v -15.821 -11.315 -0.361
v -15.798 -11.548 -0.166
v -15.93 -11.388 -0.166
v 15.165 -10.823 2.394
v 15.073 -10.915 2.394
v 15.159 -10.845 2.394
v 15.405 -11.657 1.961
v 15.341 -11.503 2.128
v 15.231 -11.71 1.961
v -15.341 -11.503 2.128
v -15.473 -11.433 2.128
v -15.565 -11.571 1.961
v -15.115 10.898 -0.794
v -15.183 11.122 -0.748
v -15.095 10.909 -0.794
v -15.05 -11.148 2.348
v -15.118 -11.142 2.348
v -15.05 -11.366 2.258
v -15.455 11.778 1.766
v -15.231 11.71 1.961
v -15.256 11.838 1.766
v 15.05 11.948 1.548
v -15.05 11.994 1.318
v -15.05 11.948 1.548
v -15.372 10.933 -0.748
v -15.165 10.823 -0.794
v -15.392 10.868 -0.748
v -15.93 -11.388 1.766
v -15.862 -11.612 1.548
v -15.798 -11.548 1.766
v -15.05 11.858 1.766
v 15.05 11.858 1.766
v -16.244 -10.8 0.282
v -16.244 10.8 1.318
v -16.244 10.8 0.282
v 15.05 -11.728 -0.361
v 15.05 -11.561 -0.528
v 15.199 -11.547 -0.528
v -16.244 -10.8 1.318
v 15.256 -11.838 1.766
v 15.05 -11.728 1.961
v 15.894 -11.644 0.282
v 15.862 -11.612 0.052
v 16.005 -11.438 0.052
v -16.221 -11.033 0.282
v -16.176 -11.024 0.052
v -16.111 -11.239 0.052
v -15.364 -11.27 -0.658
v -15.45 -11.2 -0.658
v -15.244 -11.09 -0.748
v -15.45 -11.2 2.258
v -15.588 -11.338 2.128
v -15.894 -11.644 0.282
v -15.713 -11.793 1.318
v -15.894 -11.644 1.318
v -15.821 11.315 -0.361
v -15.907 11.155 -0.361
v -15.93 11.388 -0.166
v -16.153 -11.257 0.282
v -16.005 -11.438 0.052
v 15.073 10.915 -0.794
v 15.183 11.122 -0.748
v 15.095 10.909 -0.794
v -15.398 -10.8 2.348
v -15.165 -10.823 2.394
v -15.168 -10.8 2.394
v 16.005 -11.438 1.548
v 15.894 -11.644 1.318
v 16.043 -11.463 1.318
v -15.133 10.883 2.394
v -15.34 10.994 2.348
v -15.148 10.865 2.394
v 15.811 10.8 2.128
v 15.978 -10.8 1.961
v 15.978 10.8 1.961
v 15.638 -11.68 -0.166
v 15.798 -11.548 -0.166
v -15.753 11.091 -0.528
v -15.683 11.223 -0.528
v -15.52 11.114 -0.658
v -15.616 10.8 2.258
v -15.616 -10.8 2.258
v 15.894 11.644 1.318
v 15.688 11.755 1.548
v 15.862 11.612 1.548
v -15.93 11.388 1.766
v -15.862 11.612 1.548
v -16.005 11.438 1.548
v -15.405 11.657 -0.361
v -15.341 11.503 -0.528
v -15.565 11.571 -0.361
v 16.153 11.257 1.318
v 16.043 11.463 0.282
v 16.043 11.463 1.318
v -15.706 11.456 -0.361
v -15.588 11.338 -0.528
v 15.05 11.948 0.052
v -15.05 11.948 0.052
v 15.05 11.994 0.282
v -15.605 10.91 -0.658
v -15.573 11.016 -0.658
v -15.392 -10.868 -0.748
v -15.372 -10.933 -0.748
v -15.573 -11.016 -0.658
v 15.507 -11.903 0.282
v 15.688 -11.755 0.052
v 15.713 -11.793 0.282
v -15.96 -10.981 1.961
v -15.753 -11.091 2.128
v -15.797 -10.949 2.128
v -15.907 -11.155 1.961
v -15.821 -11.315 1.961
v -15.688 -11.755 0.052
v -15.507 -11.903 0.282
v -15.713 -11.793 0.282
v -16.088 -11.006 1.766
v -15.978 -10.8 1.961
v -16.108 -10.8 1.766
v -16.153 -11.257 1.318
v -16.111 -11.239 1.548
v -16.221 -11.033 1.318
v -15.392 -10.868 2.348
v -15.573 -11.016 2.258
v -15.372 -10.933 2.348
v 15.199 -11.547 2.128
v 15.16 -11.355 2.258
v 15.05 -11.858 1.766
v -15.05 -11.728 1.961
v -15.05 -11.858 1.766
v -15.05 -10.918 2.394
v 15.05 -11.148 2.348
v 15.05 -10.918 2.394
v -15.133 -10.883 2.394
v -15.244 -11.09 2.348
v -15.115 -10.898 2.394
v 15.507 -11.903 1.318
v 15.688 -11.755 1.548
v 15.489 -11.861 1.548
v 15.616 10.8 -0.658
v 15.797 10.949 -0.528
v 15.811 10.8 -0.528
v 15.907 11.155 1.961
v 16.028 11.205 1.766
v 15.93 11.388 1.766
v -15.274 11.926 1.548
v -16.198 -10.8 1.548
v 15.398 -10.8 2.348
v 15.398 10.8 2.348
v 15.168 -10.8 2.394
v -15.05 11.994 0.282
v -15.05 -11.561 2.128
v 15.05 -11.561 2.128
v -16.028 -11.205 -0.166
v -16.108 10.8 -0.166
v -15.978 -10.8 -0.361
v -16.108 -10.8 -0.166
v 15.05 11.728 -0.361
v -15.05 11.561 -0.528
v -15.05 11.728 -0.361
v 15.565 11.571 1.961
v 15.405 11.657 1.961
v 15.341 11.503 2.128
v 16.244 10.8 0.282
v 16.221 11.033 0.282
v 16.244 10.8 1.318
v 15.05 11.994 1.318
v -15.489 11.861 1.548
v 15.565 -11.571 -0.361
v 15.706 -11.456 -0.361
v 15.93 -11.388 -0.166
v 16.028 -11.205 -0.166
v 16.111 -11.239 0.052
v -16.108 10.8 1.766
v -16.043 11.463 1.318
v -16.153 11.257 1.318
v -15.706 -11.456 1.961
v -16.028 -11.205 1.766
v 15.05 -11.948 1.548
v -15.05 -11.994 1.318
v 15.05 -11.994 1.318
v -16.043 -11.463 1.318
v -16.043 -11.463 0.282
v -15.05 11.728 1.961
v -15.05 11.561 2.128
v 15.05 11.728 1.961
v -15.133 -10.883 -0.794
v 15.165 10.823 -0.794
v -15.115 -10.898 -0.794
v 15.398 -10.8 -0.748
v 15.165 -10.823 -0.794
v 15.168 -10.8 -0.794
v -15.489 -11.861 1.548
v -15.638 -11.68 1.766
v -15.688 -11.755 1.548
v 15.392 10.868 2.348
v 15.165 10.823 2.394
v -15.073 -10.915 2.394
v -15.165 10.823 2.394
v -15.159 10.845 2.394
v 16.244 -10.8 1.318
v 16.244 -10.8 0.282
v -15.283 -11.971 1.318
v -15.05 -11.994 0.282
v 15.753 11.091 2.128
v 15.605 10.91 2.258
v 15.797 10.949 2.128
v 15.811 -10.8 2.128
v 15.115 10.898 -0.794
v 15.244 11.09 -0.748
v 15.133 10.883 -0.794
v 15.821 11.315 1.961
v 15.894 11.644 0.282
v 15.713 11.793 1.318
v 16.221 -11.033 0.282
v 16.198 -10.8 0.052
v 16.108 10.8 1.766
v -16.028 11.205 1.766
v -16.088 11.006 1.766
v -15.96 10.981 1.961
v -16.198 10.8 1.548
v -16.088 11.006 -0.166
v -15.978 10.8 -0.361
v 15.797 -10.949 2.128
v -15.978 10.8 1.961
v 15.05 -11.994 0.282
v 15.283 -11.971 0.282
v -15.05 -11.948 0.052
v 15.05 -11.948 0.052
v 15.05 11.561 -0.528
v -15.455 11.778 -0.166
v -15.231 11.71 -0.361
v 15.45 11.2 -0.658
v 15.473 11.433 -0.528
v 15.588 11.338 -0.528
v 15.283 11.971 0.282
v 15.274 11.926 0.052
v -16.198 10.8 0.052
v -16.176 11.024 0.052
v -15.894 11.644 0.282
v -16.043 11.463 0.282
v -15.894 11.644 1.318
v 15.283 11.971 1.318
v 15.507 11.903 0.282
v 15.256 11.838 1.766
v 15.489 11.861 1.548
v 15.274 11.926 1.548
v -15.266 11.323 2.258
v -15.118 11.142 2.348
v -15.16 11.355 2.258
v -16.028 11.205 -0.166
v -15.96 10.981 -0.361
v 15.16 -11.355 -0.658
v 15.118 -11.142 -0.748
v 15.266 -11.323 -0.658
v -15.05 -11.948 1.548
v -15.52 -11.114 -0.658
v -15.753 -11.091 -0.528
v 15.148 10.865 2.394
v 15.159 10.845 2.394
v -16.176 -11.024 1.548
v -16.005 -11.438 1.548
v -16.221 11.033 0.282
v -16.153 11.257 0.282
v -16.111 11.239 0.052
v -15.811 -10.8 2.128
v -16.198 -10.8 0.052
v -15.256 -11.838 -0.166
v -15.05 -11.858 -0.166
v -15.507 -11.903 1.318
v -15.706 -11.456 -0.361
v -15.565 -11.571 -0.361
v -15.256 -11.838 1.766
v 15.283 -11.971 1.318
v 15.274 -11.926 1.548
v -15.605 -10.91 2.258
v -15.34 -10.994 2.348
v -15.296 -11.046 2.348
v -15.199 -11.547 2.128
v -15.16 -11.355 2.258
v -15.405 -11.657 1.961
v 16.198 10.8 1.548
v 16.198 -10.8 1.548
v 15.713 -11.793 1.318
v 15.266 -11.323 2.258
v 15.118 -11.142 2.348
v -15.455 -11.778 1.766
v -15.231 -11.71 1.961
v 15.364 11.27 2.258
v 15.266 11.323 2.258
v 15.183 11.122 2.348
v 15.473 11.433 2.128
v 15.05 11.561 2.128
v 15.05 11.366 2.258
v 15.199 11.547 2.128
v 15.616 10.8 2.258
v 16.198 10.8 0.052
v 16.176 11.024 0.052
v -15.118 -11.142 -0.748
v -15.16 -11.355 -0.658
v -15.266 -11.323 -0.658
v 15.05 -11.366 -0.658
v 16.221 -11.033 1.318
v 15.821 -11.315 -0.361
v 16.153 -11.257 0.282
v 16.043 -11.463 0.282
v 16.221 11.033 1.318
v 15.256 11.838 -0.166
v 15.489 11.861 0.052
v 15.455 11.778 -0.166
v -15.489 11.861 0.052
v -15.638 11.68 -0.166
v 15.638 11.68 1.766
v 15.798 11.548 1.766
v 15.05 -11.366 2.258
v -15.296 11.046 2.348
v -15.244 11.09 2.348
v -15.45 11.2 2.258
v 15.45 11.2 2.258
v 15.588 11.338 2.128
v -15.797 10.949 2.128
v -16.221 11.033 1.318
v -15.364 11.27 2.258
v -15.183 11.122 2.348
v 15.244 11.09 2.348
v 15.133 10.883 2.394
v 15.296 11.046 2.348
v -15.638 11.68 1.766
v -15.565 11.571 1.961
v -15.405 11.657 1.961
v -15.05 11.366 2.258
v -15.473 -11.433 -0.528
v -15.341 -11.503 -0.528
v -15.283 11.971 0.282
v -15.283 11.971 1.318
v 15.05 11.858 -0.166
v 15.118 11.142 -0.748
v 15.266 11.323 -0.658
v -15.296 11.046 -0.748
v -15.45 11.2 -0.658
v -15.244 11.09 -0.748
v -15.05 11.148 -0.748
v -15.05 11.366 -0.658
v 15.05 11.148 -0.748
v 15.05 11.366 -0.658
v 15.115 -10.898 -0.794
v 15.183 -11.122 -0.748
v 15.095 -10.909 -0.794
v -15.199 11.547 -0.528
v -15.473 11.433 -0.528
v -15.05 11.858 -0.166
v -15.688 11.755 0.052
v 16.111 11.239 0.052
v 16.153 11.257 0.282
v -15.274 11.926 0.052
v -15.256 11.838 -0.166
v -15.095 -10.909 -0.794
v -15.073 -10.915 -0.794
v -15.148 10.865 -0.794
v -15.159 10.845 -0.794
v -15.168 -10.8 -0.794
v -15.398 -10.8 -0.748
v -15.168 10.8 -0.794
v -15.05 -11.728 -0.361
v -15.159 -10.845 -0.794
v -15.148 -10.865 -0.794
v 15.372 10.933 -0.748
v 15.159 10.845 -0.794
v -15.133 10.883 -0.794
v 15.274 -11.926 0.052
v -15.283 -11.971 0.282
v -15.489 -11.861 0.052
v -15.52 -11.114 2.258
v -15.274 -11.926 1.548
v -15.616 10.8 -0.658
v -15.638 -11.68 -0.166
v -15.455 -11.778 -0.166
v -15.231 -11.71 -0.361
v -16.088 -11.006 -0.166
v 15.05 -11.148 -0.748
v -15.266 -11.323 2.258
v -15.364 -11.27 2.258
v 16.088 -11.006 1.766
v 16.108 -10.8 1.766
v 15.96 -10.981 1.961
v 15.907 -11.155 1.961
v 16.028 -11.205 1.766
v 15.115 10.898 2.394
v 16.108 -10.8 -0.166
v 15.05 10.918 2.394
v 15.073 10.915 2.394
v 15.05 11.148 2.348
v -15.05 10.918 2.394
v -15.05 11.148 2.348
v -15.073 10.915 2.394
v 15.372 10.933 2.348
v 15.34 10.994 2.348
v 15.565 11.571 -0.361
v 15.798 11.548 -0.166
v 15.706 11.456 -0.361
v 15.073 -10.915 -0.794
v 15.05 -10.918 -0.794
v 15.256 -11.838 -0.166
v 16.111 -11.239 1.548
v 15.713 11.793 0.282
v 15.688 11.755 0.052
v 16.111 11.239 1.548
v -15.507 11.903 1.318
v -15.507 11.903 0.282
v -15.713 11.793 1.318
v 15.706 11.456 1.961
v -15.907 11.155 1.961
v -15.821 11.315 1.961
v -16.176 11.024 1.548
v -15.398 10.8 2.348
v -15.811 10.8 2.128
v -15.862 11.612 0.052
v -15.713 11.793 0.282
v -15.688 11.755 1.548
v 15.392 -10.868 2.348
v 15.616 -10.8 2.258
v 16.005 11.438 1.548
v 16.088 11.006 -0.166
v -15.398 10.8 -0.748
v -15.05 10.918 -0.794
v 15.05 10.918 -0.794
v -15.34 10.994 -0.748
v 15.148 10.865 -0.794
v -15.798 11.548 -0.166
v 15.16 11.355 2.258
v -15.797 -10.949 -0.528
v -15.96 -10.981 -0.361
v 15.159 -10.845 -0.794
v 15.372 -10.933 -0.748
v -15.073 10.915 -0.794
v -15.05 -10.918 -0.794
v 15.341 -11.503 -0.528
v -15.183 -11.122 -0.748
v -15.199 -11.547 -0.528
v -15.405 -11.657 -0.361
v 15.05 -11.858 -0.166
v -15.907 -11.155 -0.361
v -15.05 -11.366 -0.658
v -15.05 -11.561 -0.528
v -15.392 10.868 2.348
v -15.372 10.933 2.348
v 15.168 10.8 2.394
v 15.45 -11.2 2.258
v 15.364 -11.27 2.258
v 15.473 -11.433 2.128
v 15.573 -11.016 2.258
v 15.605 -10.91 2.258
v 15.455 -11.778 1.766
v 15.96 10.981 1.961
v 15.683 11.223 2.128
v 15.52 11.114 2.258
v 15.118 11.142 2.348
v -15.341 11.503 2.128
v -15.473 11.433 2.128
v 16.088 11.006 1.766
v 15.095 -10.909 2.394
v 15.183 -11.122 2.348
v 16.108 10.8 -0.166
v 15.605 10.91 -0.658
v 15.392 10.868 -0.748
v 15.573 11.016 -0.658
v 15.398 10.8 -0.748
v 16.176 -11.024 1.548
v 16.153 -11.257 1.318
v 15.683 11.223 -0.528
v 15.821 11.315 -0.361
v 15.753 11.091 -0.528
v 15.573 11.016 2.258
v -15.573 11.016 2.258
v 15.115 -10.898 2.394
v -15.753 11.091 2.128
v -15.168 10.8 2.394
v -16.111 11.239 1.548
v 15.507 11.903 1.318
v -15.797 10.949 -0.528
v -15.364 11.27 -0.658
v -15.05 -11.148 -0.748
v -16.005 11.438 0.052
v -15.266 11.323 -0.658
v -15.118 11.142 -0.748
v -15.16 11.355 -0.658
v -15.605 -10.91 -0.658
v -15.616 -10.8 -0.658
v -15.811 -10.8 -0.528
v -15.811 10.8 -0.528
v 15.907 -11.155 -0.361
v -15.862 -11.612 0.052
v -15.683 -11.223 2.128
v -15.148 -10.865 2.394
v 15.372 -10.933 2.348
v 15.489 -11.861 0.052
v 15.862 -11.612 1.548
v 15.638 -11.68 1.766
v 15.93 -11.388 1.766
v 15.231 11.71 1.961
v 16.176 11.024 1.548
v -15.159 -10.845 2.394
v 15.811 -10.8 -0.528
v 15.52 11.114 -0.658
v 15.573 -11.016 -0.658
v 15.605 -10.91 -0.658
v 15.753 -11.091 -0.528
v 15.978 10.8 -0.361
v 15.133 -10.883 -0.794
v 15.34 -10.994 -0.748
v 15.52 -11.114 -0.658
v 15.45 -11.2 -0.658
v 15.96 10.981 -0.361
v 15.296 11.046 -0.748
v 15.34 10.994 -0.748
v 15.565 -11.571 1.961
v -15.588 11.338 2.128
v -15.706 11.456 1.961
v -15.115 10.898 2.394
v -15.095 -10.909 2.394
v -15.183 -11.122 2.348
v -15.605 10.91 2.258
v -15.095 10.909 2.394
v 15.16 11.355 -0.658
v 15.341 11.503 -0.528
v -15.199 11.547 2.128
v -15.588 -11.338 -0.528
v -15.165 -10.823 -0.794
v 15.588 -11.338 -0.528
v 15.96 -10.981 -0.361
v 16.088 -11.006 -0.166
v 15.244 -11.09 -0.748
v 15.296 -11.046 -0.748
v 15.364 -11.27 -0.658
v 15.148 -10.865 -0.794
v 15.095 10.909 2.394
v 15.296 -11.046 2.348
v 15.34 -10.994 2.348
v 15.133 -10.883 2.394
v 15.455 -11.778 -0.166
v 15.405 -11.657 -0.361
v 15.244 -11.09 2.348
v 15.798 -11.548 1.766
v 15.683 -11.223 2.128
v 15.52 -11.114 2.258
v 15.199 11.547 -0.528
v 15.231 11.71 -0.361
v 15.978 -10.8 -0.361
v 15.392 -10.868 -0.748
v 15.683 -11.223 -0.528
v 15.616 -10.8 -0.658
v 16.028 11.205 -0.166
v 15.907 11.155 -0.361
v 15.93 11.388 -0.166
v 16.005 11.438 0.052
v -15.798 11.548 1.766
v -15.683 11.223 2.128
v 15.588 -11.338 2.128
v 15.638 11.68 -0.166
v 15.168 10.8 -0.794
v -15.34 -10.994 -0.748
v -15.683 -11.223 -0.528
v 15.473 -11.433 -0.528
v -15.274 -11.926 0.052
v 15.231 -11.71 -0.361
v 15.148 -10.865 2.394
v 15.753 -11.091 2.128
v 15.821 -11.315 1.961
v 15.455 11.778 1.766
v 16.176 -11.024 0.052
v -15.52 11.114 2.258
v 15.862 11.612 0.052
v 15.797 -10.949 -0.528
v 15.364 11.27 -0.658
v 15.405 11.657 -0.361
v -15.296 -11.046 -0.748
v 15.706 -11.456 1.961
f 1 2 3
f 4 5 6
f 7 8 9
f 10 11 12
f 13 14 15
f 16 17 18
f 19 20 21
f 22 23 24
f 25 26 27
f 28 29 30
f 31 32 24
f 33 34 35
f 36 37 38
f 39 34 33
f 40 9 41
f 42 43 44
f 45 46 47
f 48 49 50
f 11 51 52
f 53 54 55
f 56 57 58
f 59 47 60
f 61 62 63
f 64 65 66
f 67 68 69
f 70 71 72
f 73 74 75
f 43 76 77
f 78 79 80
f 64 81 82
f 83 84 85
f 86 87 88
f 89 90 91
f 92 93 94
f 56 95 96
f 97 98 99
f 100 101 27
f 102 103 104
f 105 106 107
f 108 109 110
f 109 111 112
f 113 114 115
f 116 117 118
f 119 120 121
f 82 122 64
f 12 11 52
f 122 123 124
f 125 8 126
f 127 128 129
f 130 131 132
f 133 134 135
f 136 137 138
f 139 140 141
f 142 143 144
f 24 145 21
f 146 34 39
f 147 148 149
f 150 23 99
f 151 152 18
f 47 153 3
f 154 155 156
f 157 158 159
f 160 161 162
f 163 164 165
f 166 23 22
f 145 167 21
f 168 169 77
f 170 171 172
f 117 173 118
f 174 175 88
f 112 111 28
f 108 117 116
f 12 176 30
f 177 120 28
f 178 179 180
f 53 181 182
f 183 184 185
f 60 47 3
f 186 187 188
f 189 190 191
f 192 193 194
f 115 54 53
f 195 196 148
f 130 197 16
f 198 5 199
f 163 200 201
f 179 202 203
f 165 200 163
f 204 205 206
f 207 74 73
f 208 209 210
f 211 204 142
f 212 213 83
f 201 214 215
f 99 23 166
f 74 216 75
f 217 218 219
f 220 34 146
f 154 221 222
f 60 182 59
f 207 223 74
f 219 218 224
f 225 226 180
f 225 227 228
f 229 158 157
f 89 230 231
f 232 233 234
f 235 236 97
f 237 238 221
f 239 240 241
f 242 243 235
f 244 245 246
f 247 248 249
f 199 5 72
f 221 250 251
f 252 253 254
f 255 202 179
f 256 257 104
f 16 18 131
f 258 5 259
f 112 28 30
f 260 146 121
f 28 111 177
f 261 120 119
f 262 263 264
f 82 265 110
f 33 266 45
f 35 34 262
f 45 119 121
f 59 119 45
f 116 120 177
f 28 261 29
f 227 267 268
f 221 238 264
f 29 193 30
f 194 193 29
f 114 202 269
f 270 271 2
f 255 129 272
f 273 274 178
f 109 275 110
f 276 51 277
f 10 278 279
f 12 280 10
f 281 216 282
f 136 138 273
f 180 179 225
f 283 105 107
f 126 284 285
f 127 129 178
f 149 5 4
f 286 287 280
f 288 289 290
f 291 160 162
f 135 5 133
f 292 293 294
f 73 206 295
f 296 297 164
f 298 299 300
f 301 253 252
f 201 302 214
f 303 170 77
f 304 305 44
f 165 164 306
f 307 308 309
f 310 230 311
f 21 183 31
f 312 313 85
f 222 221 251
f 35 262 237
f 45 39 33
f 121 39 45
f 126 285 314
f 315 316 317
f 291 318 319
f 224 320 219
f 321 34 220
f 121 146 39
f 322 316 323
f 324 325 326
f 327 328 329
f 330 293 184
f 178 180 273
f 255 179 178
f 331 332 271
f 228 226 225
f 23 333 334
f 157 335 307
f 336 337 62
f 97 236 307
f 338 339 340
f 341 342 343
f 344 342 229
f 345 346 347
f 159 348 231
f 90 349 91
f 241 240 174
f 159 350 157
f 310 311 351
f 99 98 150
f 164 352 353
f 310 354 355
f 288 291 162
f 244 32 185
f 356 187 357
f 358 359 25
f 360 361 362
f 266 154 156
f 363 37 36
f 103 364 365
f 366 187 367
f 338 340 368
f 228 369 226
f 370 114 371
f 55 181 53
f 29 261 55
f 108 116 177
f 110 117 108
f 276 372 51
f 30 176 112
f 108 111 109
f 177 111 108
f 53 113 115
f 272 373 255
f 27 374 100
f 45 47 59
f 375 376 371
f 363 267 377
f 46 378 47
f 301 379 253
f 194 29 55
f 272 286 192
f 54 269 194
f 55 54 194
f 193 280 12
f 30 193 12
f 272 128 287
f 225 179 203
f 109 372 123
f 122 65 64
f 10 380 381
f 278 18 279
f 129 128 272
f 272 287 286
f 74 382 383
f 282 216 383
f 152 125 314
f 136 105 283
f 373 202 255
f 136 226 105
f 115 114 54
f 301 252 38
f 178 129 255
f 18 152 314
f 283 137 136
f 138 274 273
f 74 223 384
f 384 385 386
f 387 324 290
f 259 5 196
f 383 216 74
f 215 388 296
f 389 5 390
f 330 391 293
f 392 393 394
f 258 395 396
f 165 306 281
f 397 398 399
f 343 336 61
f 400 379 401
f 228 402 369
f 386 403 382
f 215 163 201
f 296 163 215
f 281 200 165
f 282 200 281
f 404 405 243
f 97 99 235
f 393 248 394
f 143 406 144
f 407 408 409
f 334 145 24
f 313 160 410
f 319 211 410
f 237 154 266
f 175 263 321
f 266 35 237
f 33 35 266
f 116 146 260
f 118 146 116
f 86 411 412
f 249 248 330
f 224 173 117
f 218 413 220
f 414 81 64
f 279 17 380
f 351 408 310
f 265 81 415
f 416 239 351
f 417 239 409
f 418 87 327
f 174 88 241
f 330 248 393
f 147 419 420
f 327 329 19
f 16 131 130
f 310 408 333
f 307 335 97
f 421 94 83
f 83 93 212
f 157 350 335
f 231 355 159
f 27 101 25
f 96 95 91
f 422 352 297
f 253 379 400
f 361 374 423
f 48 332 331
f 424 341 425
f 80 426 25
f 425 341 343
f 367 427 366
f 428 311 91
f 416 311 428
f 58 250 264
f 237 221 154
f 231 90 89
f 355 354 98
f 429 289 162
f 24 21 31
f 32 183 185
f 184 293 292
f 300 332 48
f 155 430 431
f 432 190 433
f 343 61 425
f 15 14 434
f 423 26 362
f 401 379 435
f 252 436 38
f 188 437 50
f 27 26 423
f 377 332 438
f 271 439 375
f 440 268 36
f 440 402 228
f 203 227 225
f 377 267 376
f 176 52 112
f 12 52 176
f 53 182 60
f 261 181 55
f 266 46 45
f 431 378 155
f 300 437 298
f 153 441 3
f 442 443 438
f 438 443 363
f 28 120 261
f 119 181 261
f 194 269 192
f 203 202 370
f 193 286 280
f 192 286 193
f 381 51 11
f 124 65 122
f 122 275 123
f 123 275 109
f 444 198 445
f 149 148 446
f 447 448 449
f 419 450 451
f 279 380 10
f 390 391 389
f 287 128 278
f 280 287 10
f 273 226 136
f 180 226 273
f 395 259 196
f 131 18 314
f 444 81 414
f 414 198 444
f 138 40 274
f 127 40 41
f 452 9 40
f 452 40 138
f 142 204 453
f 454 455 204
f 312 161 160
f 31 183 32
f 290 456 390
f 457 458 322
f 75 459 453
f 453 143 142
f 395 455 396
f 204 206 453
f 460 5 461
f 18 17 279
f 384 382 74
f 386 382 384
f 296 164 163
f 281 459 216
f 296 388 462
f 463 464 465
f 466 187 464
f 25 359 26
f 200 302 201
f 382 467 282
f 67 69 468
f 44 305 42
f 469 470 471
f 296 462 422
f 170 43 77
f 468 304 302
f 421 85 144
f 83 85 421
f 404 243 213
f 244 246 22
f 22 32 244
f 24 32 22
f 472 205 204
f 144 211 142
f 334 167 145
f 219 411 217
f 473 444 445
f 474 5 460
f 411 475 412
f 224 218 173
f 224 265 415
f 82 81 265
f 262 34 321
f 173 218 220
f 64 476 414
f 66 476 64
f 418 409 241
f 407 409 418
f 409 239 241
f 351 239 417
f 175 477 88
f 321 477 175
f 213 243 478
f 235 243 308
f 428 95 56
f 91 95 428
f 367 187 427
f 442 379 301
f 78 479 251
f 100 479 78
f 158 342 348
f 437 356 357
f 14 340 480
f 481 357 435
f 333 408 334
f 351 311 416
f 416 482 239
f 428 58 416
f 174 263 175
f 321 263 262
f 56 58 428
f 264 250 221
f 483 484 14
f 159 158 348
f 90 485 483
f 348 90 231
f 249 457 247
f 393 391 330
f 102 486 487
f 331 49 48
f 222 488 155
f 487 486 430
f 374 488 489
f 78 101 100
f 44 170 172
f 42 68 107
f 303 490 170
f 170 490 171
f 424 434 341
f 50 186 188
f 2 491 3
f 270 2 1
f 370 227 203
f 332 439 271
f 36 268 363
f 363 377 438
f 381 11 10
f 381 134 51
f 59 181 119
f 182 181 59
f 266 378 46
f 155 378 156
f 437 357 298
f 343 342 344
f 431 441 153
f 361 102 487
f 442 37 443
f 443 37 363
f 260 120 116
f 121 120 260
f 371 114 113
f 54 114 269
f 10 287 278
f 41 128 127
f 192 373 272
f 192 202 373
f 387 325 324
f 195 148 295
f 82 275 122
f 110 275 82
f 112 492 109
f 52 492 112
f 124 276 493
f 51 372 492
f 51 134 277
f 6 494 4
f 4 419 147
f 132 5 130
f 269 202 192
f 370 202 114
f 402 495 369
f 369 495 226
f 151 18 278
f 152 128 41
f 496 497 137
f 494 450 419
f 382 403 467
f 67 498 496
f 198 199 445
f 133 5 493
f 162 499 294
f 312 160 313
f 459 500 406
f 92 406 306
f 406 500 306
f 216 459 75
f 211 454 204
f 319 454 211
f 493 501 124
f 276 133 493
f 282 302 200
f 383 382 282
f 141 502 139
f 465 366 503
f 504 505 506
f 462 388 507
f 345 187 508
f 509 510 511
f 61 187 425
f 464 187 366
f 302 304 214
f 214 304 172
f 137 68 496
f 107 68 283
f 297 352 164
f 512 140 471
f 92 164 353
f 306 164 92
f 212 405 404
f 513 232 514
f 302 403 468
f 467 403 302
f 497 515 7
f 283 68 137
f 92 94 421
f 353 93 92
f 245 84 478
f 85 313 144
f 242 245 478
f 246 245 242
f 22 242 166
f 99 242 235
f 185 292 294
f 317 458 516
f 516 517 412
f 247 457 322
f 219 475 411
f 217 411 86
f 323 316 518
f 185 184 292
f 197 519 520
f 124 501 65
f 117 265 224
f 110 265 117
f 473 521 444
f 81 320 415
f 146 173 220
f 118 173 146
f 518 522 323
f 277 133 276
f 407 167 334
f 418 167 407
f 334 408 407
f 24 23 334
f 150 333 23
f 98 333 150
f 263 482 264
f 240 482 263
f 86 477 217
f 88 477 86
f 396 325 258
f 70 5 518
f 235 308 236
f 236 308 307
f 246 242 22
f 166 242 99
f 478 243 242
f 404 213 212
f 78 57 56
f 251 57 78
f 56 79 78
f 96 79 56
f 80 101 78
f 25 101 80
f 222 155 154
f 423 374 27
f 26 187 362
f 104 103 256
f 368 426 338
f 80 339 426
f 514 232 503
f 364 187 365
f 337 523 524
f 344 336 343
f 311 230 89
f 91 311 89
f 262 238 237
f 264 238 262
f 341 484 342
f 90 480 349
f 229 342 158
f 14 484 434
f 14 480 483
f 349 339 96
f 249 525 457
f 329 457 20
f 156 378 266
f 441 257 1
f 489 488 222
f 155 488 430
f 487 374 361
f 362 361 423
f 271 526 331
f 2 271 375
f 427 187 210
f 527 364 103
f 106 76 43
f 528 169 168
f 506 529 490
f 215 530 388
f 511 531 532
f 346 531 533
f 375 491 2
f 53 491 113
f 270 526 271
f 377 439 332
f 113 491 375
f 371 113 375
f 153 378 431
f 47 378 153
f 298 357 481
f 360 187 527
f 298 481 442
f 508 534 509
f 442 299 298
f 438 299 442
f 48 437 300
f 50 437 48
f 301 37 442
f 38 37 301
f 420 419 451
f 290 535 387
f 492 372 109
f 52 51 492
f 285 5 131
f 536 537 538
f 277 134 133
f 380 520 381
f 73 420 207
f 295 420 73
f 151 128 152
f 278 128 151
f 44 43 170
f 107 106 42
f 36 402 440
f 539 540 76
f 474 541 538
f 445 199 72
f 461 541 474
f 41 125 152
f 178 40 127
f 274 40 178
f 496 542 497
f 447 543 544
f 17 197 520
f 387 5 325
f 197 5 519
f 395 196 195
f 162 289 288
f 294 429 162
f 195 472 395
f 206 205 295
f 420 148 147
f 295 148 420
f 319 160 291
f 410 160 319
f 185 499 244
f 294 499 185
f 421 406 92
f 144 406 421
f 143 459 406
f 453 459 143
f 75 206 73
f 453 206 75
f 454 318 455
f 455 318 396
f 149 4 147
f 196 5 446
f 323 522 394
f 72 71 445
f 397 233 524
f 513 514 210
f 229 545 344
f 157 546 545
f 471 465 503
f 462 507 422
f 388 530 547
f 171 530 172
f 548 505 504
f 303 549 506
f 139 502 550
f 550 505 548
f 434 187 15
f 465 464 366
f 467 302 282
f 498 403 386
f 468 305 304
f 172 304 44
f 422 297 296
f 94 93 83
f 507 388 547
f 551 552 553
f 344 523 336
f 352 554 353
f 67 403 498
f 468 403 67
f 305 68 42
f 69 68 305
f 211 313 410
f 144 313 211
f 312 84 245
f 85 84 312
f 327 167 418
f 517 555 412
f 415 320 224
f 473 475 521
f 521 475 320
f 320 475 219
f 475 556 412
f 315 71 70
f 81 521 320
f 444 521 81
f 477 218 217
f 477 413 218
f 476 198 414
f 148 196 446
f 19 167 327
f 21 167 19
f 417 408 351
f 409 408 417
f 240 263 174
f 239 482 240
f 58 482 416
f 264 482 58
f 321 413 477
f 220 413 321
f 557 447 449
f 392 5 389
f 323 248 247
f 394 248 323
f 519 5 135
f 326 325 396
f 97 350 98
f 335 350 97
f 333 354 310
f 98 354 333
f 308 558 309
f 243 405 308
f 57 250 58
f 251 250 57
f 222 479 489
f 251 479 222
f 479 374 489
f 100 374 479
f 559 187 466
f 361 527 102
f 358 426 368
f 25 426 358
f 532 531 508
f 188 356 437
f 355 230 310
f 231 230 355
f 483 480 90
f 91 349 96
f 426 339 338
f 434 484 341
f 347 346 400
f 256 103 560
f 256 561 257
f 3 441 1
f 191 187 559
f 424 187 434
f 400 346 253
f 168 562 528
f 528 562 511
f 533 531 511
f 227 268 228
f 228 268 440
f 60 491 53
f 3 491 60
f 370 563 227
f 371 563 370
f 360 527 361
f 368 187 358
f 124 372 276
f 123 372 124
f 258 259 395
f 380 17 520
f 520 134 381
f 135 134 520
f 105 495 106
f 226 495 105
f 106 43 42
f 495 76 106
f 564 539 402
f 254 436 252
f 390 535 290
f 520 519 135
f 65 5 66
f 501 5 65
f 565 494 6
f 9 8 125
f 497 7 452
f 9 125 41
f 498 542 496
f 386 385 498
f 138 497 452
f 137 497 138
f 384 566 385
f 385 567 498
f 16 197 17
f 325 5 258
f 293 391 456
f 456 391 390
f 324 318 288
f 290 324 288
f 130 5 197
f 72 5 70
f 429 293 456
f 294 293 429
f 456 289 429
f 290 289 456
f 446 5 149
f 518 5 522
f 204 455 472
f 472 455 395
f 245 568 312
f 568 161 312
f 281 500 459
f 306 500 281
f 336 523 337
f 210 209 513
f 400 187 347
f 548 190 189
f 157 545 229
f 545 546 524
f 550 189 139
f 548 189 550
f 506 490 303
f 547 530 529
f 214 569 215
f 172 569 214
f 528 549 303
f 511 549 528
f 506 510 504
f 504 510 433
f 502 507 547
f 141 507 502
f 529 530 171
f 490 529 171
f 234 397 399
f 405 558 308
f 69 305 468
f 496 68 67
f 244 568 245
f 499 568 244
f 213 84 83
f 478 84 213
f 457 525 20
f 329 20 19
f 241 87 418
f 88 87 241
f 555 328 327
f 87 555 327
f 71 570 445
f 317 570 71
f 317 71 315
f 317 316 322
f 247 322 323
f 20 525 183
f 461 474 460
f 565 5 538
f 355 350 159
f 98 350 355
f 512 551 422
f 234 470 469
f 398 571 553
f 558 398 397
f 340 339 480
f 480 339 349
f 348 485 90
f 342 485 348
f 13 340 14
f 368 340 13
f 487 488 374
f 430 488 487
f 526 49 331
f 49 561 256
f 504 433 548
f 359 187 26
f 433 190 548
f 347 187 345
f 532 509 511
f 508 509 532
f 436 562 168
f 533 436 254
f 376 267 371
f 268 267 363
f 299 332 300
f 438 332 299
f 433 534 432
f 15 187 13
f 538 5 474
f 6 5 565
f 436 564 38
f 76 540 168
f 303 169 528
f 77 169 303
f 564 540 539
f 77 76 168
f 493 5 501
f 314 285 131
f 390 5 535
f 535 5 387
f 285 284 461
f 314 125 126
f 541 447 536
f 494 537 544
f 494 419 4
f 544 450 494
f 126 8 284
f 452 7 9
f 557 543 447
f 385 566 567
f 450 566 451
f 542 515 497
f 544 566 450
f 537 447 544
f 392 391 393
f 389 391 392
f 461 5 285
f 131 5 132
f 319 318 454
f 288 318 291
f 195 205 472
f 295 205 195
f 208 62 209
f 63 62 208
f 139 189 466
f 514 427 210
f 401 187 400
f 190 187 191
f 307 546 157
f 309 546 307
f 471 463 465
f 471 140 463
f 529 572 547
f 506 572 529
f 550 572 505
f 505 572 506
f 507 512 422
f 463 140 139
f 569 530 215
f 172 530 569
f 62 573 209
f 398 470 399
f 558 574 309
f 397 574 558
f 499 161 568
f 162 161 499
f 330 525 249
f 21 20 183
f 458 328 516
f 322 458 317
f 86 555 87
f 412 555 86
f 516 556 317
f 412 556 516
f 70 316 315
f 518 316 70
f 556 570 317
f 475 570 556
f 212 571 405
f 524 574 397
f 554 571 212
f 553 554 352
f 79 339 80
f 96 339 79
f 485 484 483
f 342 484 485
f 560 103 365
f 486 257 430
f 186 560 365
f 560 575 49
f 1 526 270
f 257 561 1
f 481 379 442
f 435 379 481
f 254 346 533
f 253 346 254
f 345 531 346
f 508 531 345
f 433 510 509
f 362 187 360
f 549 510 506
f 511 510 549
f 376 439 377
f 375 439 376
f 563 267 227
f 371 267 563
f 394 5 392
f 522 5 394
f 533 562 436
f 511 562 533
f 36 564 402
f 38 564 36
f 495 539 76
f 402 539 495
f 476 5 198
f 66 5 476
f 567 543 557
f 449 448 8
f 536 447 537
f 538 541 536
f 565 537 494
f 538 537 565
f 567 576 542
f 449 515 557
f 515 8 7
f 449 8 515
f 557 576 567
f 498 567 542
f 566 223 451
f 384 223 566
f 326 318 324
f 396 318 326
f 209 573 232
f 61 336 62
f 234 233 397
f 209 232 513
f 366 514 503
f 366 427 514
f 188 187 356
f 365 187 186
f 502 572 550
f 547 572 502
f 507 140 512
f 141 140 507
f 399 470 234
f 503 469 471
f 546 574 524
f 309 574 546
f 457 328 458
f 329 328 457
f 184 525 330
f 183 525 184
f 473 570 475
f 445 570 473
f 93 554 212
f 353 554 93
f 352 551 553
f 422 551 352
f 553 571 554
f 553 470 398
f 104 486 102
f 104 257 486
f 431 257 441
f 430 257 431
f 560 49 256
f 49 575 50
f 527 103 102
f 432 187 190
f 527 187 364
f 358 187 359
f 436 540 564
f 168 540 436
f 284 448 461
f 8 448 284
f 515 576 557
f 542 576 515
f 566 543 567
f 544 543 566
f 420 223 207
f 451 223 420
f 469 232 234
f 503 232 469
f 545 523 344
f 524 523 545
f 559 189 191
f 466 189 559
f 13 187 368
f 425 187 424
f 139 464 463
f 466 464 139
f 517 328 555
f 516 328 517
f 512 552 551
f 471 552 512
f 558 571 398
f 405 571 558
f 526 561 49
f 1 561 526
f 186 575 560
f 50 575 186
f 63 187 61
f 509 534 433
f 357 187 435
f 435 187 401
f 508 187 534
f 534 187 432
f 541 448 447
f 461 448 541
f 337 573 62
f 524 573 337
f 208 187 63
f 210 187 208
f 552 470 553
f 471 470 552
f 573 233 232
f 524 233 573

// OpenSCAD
// PIR HC-SR501 (PIR 人體感測器) visual source for NexCAD.
// Units: millimeters. Origin: part bottom-center, matching src/parts/library.ts.
// This generated baseline is intentionally simple; refine it with measured details before exporting STL.

$fn = 32;

module rounded_box(size, r = 0.8) {
  hull() {
    for (x = [-size[0] / 2 + r, size[0] / 2 - r])
      for (y = [-size[1] / 2 + r, size[1] / 2 - r]) {
        translate([x, y, r]) sphere(r = r);
        translate([x, y, size[2] - r]) sphere(r = r);
      }
  }
}

color("#2e7d5b") rounded_box([32.5, 24, 1.6], min(1.2, min(32.5, 24) / 8));
